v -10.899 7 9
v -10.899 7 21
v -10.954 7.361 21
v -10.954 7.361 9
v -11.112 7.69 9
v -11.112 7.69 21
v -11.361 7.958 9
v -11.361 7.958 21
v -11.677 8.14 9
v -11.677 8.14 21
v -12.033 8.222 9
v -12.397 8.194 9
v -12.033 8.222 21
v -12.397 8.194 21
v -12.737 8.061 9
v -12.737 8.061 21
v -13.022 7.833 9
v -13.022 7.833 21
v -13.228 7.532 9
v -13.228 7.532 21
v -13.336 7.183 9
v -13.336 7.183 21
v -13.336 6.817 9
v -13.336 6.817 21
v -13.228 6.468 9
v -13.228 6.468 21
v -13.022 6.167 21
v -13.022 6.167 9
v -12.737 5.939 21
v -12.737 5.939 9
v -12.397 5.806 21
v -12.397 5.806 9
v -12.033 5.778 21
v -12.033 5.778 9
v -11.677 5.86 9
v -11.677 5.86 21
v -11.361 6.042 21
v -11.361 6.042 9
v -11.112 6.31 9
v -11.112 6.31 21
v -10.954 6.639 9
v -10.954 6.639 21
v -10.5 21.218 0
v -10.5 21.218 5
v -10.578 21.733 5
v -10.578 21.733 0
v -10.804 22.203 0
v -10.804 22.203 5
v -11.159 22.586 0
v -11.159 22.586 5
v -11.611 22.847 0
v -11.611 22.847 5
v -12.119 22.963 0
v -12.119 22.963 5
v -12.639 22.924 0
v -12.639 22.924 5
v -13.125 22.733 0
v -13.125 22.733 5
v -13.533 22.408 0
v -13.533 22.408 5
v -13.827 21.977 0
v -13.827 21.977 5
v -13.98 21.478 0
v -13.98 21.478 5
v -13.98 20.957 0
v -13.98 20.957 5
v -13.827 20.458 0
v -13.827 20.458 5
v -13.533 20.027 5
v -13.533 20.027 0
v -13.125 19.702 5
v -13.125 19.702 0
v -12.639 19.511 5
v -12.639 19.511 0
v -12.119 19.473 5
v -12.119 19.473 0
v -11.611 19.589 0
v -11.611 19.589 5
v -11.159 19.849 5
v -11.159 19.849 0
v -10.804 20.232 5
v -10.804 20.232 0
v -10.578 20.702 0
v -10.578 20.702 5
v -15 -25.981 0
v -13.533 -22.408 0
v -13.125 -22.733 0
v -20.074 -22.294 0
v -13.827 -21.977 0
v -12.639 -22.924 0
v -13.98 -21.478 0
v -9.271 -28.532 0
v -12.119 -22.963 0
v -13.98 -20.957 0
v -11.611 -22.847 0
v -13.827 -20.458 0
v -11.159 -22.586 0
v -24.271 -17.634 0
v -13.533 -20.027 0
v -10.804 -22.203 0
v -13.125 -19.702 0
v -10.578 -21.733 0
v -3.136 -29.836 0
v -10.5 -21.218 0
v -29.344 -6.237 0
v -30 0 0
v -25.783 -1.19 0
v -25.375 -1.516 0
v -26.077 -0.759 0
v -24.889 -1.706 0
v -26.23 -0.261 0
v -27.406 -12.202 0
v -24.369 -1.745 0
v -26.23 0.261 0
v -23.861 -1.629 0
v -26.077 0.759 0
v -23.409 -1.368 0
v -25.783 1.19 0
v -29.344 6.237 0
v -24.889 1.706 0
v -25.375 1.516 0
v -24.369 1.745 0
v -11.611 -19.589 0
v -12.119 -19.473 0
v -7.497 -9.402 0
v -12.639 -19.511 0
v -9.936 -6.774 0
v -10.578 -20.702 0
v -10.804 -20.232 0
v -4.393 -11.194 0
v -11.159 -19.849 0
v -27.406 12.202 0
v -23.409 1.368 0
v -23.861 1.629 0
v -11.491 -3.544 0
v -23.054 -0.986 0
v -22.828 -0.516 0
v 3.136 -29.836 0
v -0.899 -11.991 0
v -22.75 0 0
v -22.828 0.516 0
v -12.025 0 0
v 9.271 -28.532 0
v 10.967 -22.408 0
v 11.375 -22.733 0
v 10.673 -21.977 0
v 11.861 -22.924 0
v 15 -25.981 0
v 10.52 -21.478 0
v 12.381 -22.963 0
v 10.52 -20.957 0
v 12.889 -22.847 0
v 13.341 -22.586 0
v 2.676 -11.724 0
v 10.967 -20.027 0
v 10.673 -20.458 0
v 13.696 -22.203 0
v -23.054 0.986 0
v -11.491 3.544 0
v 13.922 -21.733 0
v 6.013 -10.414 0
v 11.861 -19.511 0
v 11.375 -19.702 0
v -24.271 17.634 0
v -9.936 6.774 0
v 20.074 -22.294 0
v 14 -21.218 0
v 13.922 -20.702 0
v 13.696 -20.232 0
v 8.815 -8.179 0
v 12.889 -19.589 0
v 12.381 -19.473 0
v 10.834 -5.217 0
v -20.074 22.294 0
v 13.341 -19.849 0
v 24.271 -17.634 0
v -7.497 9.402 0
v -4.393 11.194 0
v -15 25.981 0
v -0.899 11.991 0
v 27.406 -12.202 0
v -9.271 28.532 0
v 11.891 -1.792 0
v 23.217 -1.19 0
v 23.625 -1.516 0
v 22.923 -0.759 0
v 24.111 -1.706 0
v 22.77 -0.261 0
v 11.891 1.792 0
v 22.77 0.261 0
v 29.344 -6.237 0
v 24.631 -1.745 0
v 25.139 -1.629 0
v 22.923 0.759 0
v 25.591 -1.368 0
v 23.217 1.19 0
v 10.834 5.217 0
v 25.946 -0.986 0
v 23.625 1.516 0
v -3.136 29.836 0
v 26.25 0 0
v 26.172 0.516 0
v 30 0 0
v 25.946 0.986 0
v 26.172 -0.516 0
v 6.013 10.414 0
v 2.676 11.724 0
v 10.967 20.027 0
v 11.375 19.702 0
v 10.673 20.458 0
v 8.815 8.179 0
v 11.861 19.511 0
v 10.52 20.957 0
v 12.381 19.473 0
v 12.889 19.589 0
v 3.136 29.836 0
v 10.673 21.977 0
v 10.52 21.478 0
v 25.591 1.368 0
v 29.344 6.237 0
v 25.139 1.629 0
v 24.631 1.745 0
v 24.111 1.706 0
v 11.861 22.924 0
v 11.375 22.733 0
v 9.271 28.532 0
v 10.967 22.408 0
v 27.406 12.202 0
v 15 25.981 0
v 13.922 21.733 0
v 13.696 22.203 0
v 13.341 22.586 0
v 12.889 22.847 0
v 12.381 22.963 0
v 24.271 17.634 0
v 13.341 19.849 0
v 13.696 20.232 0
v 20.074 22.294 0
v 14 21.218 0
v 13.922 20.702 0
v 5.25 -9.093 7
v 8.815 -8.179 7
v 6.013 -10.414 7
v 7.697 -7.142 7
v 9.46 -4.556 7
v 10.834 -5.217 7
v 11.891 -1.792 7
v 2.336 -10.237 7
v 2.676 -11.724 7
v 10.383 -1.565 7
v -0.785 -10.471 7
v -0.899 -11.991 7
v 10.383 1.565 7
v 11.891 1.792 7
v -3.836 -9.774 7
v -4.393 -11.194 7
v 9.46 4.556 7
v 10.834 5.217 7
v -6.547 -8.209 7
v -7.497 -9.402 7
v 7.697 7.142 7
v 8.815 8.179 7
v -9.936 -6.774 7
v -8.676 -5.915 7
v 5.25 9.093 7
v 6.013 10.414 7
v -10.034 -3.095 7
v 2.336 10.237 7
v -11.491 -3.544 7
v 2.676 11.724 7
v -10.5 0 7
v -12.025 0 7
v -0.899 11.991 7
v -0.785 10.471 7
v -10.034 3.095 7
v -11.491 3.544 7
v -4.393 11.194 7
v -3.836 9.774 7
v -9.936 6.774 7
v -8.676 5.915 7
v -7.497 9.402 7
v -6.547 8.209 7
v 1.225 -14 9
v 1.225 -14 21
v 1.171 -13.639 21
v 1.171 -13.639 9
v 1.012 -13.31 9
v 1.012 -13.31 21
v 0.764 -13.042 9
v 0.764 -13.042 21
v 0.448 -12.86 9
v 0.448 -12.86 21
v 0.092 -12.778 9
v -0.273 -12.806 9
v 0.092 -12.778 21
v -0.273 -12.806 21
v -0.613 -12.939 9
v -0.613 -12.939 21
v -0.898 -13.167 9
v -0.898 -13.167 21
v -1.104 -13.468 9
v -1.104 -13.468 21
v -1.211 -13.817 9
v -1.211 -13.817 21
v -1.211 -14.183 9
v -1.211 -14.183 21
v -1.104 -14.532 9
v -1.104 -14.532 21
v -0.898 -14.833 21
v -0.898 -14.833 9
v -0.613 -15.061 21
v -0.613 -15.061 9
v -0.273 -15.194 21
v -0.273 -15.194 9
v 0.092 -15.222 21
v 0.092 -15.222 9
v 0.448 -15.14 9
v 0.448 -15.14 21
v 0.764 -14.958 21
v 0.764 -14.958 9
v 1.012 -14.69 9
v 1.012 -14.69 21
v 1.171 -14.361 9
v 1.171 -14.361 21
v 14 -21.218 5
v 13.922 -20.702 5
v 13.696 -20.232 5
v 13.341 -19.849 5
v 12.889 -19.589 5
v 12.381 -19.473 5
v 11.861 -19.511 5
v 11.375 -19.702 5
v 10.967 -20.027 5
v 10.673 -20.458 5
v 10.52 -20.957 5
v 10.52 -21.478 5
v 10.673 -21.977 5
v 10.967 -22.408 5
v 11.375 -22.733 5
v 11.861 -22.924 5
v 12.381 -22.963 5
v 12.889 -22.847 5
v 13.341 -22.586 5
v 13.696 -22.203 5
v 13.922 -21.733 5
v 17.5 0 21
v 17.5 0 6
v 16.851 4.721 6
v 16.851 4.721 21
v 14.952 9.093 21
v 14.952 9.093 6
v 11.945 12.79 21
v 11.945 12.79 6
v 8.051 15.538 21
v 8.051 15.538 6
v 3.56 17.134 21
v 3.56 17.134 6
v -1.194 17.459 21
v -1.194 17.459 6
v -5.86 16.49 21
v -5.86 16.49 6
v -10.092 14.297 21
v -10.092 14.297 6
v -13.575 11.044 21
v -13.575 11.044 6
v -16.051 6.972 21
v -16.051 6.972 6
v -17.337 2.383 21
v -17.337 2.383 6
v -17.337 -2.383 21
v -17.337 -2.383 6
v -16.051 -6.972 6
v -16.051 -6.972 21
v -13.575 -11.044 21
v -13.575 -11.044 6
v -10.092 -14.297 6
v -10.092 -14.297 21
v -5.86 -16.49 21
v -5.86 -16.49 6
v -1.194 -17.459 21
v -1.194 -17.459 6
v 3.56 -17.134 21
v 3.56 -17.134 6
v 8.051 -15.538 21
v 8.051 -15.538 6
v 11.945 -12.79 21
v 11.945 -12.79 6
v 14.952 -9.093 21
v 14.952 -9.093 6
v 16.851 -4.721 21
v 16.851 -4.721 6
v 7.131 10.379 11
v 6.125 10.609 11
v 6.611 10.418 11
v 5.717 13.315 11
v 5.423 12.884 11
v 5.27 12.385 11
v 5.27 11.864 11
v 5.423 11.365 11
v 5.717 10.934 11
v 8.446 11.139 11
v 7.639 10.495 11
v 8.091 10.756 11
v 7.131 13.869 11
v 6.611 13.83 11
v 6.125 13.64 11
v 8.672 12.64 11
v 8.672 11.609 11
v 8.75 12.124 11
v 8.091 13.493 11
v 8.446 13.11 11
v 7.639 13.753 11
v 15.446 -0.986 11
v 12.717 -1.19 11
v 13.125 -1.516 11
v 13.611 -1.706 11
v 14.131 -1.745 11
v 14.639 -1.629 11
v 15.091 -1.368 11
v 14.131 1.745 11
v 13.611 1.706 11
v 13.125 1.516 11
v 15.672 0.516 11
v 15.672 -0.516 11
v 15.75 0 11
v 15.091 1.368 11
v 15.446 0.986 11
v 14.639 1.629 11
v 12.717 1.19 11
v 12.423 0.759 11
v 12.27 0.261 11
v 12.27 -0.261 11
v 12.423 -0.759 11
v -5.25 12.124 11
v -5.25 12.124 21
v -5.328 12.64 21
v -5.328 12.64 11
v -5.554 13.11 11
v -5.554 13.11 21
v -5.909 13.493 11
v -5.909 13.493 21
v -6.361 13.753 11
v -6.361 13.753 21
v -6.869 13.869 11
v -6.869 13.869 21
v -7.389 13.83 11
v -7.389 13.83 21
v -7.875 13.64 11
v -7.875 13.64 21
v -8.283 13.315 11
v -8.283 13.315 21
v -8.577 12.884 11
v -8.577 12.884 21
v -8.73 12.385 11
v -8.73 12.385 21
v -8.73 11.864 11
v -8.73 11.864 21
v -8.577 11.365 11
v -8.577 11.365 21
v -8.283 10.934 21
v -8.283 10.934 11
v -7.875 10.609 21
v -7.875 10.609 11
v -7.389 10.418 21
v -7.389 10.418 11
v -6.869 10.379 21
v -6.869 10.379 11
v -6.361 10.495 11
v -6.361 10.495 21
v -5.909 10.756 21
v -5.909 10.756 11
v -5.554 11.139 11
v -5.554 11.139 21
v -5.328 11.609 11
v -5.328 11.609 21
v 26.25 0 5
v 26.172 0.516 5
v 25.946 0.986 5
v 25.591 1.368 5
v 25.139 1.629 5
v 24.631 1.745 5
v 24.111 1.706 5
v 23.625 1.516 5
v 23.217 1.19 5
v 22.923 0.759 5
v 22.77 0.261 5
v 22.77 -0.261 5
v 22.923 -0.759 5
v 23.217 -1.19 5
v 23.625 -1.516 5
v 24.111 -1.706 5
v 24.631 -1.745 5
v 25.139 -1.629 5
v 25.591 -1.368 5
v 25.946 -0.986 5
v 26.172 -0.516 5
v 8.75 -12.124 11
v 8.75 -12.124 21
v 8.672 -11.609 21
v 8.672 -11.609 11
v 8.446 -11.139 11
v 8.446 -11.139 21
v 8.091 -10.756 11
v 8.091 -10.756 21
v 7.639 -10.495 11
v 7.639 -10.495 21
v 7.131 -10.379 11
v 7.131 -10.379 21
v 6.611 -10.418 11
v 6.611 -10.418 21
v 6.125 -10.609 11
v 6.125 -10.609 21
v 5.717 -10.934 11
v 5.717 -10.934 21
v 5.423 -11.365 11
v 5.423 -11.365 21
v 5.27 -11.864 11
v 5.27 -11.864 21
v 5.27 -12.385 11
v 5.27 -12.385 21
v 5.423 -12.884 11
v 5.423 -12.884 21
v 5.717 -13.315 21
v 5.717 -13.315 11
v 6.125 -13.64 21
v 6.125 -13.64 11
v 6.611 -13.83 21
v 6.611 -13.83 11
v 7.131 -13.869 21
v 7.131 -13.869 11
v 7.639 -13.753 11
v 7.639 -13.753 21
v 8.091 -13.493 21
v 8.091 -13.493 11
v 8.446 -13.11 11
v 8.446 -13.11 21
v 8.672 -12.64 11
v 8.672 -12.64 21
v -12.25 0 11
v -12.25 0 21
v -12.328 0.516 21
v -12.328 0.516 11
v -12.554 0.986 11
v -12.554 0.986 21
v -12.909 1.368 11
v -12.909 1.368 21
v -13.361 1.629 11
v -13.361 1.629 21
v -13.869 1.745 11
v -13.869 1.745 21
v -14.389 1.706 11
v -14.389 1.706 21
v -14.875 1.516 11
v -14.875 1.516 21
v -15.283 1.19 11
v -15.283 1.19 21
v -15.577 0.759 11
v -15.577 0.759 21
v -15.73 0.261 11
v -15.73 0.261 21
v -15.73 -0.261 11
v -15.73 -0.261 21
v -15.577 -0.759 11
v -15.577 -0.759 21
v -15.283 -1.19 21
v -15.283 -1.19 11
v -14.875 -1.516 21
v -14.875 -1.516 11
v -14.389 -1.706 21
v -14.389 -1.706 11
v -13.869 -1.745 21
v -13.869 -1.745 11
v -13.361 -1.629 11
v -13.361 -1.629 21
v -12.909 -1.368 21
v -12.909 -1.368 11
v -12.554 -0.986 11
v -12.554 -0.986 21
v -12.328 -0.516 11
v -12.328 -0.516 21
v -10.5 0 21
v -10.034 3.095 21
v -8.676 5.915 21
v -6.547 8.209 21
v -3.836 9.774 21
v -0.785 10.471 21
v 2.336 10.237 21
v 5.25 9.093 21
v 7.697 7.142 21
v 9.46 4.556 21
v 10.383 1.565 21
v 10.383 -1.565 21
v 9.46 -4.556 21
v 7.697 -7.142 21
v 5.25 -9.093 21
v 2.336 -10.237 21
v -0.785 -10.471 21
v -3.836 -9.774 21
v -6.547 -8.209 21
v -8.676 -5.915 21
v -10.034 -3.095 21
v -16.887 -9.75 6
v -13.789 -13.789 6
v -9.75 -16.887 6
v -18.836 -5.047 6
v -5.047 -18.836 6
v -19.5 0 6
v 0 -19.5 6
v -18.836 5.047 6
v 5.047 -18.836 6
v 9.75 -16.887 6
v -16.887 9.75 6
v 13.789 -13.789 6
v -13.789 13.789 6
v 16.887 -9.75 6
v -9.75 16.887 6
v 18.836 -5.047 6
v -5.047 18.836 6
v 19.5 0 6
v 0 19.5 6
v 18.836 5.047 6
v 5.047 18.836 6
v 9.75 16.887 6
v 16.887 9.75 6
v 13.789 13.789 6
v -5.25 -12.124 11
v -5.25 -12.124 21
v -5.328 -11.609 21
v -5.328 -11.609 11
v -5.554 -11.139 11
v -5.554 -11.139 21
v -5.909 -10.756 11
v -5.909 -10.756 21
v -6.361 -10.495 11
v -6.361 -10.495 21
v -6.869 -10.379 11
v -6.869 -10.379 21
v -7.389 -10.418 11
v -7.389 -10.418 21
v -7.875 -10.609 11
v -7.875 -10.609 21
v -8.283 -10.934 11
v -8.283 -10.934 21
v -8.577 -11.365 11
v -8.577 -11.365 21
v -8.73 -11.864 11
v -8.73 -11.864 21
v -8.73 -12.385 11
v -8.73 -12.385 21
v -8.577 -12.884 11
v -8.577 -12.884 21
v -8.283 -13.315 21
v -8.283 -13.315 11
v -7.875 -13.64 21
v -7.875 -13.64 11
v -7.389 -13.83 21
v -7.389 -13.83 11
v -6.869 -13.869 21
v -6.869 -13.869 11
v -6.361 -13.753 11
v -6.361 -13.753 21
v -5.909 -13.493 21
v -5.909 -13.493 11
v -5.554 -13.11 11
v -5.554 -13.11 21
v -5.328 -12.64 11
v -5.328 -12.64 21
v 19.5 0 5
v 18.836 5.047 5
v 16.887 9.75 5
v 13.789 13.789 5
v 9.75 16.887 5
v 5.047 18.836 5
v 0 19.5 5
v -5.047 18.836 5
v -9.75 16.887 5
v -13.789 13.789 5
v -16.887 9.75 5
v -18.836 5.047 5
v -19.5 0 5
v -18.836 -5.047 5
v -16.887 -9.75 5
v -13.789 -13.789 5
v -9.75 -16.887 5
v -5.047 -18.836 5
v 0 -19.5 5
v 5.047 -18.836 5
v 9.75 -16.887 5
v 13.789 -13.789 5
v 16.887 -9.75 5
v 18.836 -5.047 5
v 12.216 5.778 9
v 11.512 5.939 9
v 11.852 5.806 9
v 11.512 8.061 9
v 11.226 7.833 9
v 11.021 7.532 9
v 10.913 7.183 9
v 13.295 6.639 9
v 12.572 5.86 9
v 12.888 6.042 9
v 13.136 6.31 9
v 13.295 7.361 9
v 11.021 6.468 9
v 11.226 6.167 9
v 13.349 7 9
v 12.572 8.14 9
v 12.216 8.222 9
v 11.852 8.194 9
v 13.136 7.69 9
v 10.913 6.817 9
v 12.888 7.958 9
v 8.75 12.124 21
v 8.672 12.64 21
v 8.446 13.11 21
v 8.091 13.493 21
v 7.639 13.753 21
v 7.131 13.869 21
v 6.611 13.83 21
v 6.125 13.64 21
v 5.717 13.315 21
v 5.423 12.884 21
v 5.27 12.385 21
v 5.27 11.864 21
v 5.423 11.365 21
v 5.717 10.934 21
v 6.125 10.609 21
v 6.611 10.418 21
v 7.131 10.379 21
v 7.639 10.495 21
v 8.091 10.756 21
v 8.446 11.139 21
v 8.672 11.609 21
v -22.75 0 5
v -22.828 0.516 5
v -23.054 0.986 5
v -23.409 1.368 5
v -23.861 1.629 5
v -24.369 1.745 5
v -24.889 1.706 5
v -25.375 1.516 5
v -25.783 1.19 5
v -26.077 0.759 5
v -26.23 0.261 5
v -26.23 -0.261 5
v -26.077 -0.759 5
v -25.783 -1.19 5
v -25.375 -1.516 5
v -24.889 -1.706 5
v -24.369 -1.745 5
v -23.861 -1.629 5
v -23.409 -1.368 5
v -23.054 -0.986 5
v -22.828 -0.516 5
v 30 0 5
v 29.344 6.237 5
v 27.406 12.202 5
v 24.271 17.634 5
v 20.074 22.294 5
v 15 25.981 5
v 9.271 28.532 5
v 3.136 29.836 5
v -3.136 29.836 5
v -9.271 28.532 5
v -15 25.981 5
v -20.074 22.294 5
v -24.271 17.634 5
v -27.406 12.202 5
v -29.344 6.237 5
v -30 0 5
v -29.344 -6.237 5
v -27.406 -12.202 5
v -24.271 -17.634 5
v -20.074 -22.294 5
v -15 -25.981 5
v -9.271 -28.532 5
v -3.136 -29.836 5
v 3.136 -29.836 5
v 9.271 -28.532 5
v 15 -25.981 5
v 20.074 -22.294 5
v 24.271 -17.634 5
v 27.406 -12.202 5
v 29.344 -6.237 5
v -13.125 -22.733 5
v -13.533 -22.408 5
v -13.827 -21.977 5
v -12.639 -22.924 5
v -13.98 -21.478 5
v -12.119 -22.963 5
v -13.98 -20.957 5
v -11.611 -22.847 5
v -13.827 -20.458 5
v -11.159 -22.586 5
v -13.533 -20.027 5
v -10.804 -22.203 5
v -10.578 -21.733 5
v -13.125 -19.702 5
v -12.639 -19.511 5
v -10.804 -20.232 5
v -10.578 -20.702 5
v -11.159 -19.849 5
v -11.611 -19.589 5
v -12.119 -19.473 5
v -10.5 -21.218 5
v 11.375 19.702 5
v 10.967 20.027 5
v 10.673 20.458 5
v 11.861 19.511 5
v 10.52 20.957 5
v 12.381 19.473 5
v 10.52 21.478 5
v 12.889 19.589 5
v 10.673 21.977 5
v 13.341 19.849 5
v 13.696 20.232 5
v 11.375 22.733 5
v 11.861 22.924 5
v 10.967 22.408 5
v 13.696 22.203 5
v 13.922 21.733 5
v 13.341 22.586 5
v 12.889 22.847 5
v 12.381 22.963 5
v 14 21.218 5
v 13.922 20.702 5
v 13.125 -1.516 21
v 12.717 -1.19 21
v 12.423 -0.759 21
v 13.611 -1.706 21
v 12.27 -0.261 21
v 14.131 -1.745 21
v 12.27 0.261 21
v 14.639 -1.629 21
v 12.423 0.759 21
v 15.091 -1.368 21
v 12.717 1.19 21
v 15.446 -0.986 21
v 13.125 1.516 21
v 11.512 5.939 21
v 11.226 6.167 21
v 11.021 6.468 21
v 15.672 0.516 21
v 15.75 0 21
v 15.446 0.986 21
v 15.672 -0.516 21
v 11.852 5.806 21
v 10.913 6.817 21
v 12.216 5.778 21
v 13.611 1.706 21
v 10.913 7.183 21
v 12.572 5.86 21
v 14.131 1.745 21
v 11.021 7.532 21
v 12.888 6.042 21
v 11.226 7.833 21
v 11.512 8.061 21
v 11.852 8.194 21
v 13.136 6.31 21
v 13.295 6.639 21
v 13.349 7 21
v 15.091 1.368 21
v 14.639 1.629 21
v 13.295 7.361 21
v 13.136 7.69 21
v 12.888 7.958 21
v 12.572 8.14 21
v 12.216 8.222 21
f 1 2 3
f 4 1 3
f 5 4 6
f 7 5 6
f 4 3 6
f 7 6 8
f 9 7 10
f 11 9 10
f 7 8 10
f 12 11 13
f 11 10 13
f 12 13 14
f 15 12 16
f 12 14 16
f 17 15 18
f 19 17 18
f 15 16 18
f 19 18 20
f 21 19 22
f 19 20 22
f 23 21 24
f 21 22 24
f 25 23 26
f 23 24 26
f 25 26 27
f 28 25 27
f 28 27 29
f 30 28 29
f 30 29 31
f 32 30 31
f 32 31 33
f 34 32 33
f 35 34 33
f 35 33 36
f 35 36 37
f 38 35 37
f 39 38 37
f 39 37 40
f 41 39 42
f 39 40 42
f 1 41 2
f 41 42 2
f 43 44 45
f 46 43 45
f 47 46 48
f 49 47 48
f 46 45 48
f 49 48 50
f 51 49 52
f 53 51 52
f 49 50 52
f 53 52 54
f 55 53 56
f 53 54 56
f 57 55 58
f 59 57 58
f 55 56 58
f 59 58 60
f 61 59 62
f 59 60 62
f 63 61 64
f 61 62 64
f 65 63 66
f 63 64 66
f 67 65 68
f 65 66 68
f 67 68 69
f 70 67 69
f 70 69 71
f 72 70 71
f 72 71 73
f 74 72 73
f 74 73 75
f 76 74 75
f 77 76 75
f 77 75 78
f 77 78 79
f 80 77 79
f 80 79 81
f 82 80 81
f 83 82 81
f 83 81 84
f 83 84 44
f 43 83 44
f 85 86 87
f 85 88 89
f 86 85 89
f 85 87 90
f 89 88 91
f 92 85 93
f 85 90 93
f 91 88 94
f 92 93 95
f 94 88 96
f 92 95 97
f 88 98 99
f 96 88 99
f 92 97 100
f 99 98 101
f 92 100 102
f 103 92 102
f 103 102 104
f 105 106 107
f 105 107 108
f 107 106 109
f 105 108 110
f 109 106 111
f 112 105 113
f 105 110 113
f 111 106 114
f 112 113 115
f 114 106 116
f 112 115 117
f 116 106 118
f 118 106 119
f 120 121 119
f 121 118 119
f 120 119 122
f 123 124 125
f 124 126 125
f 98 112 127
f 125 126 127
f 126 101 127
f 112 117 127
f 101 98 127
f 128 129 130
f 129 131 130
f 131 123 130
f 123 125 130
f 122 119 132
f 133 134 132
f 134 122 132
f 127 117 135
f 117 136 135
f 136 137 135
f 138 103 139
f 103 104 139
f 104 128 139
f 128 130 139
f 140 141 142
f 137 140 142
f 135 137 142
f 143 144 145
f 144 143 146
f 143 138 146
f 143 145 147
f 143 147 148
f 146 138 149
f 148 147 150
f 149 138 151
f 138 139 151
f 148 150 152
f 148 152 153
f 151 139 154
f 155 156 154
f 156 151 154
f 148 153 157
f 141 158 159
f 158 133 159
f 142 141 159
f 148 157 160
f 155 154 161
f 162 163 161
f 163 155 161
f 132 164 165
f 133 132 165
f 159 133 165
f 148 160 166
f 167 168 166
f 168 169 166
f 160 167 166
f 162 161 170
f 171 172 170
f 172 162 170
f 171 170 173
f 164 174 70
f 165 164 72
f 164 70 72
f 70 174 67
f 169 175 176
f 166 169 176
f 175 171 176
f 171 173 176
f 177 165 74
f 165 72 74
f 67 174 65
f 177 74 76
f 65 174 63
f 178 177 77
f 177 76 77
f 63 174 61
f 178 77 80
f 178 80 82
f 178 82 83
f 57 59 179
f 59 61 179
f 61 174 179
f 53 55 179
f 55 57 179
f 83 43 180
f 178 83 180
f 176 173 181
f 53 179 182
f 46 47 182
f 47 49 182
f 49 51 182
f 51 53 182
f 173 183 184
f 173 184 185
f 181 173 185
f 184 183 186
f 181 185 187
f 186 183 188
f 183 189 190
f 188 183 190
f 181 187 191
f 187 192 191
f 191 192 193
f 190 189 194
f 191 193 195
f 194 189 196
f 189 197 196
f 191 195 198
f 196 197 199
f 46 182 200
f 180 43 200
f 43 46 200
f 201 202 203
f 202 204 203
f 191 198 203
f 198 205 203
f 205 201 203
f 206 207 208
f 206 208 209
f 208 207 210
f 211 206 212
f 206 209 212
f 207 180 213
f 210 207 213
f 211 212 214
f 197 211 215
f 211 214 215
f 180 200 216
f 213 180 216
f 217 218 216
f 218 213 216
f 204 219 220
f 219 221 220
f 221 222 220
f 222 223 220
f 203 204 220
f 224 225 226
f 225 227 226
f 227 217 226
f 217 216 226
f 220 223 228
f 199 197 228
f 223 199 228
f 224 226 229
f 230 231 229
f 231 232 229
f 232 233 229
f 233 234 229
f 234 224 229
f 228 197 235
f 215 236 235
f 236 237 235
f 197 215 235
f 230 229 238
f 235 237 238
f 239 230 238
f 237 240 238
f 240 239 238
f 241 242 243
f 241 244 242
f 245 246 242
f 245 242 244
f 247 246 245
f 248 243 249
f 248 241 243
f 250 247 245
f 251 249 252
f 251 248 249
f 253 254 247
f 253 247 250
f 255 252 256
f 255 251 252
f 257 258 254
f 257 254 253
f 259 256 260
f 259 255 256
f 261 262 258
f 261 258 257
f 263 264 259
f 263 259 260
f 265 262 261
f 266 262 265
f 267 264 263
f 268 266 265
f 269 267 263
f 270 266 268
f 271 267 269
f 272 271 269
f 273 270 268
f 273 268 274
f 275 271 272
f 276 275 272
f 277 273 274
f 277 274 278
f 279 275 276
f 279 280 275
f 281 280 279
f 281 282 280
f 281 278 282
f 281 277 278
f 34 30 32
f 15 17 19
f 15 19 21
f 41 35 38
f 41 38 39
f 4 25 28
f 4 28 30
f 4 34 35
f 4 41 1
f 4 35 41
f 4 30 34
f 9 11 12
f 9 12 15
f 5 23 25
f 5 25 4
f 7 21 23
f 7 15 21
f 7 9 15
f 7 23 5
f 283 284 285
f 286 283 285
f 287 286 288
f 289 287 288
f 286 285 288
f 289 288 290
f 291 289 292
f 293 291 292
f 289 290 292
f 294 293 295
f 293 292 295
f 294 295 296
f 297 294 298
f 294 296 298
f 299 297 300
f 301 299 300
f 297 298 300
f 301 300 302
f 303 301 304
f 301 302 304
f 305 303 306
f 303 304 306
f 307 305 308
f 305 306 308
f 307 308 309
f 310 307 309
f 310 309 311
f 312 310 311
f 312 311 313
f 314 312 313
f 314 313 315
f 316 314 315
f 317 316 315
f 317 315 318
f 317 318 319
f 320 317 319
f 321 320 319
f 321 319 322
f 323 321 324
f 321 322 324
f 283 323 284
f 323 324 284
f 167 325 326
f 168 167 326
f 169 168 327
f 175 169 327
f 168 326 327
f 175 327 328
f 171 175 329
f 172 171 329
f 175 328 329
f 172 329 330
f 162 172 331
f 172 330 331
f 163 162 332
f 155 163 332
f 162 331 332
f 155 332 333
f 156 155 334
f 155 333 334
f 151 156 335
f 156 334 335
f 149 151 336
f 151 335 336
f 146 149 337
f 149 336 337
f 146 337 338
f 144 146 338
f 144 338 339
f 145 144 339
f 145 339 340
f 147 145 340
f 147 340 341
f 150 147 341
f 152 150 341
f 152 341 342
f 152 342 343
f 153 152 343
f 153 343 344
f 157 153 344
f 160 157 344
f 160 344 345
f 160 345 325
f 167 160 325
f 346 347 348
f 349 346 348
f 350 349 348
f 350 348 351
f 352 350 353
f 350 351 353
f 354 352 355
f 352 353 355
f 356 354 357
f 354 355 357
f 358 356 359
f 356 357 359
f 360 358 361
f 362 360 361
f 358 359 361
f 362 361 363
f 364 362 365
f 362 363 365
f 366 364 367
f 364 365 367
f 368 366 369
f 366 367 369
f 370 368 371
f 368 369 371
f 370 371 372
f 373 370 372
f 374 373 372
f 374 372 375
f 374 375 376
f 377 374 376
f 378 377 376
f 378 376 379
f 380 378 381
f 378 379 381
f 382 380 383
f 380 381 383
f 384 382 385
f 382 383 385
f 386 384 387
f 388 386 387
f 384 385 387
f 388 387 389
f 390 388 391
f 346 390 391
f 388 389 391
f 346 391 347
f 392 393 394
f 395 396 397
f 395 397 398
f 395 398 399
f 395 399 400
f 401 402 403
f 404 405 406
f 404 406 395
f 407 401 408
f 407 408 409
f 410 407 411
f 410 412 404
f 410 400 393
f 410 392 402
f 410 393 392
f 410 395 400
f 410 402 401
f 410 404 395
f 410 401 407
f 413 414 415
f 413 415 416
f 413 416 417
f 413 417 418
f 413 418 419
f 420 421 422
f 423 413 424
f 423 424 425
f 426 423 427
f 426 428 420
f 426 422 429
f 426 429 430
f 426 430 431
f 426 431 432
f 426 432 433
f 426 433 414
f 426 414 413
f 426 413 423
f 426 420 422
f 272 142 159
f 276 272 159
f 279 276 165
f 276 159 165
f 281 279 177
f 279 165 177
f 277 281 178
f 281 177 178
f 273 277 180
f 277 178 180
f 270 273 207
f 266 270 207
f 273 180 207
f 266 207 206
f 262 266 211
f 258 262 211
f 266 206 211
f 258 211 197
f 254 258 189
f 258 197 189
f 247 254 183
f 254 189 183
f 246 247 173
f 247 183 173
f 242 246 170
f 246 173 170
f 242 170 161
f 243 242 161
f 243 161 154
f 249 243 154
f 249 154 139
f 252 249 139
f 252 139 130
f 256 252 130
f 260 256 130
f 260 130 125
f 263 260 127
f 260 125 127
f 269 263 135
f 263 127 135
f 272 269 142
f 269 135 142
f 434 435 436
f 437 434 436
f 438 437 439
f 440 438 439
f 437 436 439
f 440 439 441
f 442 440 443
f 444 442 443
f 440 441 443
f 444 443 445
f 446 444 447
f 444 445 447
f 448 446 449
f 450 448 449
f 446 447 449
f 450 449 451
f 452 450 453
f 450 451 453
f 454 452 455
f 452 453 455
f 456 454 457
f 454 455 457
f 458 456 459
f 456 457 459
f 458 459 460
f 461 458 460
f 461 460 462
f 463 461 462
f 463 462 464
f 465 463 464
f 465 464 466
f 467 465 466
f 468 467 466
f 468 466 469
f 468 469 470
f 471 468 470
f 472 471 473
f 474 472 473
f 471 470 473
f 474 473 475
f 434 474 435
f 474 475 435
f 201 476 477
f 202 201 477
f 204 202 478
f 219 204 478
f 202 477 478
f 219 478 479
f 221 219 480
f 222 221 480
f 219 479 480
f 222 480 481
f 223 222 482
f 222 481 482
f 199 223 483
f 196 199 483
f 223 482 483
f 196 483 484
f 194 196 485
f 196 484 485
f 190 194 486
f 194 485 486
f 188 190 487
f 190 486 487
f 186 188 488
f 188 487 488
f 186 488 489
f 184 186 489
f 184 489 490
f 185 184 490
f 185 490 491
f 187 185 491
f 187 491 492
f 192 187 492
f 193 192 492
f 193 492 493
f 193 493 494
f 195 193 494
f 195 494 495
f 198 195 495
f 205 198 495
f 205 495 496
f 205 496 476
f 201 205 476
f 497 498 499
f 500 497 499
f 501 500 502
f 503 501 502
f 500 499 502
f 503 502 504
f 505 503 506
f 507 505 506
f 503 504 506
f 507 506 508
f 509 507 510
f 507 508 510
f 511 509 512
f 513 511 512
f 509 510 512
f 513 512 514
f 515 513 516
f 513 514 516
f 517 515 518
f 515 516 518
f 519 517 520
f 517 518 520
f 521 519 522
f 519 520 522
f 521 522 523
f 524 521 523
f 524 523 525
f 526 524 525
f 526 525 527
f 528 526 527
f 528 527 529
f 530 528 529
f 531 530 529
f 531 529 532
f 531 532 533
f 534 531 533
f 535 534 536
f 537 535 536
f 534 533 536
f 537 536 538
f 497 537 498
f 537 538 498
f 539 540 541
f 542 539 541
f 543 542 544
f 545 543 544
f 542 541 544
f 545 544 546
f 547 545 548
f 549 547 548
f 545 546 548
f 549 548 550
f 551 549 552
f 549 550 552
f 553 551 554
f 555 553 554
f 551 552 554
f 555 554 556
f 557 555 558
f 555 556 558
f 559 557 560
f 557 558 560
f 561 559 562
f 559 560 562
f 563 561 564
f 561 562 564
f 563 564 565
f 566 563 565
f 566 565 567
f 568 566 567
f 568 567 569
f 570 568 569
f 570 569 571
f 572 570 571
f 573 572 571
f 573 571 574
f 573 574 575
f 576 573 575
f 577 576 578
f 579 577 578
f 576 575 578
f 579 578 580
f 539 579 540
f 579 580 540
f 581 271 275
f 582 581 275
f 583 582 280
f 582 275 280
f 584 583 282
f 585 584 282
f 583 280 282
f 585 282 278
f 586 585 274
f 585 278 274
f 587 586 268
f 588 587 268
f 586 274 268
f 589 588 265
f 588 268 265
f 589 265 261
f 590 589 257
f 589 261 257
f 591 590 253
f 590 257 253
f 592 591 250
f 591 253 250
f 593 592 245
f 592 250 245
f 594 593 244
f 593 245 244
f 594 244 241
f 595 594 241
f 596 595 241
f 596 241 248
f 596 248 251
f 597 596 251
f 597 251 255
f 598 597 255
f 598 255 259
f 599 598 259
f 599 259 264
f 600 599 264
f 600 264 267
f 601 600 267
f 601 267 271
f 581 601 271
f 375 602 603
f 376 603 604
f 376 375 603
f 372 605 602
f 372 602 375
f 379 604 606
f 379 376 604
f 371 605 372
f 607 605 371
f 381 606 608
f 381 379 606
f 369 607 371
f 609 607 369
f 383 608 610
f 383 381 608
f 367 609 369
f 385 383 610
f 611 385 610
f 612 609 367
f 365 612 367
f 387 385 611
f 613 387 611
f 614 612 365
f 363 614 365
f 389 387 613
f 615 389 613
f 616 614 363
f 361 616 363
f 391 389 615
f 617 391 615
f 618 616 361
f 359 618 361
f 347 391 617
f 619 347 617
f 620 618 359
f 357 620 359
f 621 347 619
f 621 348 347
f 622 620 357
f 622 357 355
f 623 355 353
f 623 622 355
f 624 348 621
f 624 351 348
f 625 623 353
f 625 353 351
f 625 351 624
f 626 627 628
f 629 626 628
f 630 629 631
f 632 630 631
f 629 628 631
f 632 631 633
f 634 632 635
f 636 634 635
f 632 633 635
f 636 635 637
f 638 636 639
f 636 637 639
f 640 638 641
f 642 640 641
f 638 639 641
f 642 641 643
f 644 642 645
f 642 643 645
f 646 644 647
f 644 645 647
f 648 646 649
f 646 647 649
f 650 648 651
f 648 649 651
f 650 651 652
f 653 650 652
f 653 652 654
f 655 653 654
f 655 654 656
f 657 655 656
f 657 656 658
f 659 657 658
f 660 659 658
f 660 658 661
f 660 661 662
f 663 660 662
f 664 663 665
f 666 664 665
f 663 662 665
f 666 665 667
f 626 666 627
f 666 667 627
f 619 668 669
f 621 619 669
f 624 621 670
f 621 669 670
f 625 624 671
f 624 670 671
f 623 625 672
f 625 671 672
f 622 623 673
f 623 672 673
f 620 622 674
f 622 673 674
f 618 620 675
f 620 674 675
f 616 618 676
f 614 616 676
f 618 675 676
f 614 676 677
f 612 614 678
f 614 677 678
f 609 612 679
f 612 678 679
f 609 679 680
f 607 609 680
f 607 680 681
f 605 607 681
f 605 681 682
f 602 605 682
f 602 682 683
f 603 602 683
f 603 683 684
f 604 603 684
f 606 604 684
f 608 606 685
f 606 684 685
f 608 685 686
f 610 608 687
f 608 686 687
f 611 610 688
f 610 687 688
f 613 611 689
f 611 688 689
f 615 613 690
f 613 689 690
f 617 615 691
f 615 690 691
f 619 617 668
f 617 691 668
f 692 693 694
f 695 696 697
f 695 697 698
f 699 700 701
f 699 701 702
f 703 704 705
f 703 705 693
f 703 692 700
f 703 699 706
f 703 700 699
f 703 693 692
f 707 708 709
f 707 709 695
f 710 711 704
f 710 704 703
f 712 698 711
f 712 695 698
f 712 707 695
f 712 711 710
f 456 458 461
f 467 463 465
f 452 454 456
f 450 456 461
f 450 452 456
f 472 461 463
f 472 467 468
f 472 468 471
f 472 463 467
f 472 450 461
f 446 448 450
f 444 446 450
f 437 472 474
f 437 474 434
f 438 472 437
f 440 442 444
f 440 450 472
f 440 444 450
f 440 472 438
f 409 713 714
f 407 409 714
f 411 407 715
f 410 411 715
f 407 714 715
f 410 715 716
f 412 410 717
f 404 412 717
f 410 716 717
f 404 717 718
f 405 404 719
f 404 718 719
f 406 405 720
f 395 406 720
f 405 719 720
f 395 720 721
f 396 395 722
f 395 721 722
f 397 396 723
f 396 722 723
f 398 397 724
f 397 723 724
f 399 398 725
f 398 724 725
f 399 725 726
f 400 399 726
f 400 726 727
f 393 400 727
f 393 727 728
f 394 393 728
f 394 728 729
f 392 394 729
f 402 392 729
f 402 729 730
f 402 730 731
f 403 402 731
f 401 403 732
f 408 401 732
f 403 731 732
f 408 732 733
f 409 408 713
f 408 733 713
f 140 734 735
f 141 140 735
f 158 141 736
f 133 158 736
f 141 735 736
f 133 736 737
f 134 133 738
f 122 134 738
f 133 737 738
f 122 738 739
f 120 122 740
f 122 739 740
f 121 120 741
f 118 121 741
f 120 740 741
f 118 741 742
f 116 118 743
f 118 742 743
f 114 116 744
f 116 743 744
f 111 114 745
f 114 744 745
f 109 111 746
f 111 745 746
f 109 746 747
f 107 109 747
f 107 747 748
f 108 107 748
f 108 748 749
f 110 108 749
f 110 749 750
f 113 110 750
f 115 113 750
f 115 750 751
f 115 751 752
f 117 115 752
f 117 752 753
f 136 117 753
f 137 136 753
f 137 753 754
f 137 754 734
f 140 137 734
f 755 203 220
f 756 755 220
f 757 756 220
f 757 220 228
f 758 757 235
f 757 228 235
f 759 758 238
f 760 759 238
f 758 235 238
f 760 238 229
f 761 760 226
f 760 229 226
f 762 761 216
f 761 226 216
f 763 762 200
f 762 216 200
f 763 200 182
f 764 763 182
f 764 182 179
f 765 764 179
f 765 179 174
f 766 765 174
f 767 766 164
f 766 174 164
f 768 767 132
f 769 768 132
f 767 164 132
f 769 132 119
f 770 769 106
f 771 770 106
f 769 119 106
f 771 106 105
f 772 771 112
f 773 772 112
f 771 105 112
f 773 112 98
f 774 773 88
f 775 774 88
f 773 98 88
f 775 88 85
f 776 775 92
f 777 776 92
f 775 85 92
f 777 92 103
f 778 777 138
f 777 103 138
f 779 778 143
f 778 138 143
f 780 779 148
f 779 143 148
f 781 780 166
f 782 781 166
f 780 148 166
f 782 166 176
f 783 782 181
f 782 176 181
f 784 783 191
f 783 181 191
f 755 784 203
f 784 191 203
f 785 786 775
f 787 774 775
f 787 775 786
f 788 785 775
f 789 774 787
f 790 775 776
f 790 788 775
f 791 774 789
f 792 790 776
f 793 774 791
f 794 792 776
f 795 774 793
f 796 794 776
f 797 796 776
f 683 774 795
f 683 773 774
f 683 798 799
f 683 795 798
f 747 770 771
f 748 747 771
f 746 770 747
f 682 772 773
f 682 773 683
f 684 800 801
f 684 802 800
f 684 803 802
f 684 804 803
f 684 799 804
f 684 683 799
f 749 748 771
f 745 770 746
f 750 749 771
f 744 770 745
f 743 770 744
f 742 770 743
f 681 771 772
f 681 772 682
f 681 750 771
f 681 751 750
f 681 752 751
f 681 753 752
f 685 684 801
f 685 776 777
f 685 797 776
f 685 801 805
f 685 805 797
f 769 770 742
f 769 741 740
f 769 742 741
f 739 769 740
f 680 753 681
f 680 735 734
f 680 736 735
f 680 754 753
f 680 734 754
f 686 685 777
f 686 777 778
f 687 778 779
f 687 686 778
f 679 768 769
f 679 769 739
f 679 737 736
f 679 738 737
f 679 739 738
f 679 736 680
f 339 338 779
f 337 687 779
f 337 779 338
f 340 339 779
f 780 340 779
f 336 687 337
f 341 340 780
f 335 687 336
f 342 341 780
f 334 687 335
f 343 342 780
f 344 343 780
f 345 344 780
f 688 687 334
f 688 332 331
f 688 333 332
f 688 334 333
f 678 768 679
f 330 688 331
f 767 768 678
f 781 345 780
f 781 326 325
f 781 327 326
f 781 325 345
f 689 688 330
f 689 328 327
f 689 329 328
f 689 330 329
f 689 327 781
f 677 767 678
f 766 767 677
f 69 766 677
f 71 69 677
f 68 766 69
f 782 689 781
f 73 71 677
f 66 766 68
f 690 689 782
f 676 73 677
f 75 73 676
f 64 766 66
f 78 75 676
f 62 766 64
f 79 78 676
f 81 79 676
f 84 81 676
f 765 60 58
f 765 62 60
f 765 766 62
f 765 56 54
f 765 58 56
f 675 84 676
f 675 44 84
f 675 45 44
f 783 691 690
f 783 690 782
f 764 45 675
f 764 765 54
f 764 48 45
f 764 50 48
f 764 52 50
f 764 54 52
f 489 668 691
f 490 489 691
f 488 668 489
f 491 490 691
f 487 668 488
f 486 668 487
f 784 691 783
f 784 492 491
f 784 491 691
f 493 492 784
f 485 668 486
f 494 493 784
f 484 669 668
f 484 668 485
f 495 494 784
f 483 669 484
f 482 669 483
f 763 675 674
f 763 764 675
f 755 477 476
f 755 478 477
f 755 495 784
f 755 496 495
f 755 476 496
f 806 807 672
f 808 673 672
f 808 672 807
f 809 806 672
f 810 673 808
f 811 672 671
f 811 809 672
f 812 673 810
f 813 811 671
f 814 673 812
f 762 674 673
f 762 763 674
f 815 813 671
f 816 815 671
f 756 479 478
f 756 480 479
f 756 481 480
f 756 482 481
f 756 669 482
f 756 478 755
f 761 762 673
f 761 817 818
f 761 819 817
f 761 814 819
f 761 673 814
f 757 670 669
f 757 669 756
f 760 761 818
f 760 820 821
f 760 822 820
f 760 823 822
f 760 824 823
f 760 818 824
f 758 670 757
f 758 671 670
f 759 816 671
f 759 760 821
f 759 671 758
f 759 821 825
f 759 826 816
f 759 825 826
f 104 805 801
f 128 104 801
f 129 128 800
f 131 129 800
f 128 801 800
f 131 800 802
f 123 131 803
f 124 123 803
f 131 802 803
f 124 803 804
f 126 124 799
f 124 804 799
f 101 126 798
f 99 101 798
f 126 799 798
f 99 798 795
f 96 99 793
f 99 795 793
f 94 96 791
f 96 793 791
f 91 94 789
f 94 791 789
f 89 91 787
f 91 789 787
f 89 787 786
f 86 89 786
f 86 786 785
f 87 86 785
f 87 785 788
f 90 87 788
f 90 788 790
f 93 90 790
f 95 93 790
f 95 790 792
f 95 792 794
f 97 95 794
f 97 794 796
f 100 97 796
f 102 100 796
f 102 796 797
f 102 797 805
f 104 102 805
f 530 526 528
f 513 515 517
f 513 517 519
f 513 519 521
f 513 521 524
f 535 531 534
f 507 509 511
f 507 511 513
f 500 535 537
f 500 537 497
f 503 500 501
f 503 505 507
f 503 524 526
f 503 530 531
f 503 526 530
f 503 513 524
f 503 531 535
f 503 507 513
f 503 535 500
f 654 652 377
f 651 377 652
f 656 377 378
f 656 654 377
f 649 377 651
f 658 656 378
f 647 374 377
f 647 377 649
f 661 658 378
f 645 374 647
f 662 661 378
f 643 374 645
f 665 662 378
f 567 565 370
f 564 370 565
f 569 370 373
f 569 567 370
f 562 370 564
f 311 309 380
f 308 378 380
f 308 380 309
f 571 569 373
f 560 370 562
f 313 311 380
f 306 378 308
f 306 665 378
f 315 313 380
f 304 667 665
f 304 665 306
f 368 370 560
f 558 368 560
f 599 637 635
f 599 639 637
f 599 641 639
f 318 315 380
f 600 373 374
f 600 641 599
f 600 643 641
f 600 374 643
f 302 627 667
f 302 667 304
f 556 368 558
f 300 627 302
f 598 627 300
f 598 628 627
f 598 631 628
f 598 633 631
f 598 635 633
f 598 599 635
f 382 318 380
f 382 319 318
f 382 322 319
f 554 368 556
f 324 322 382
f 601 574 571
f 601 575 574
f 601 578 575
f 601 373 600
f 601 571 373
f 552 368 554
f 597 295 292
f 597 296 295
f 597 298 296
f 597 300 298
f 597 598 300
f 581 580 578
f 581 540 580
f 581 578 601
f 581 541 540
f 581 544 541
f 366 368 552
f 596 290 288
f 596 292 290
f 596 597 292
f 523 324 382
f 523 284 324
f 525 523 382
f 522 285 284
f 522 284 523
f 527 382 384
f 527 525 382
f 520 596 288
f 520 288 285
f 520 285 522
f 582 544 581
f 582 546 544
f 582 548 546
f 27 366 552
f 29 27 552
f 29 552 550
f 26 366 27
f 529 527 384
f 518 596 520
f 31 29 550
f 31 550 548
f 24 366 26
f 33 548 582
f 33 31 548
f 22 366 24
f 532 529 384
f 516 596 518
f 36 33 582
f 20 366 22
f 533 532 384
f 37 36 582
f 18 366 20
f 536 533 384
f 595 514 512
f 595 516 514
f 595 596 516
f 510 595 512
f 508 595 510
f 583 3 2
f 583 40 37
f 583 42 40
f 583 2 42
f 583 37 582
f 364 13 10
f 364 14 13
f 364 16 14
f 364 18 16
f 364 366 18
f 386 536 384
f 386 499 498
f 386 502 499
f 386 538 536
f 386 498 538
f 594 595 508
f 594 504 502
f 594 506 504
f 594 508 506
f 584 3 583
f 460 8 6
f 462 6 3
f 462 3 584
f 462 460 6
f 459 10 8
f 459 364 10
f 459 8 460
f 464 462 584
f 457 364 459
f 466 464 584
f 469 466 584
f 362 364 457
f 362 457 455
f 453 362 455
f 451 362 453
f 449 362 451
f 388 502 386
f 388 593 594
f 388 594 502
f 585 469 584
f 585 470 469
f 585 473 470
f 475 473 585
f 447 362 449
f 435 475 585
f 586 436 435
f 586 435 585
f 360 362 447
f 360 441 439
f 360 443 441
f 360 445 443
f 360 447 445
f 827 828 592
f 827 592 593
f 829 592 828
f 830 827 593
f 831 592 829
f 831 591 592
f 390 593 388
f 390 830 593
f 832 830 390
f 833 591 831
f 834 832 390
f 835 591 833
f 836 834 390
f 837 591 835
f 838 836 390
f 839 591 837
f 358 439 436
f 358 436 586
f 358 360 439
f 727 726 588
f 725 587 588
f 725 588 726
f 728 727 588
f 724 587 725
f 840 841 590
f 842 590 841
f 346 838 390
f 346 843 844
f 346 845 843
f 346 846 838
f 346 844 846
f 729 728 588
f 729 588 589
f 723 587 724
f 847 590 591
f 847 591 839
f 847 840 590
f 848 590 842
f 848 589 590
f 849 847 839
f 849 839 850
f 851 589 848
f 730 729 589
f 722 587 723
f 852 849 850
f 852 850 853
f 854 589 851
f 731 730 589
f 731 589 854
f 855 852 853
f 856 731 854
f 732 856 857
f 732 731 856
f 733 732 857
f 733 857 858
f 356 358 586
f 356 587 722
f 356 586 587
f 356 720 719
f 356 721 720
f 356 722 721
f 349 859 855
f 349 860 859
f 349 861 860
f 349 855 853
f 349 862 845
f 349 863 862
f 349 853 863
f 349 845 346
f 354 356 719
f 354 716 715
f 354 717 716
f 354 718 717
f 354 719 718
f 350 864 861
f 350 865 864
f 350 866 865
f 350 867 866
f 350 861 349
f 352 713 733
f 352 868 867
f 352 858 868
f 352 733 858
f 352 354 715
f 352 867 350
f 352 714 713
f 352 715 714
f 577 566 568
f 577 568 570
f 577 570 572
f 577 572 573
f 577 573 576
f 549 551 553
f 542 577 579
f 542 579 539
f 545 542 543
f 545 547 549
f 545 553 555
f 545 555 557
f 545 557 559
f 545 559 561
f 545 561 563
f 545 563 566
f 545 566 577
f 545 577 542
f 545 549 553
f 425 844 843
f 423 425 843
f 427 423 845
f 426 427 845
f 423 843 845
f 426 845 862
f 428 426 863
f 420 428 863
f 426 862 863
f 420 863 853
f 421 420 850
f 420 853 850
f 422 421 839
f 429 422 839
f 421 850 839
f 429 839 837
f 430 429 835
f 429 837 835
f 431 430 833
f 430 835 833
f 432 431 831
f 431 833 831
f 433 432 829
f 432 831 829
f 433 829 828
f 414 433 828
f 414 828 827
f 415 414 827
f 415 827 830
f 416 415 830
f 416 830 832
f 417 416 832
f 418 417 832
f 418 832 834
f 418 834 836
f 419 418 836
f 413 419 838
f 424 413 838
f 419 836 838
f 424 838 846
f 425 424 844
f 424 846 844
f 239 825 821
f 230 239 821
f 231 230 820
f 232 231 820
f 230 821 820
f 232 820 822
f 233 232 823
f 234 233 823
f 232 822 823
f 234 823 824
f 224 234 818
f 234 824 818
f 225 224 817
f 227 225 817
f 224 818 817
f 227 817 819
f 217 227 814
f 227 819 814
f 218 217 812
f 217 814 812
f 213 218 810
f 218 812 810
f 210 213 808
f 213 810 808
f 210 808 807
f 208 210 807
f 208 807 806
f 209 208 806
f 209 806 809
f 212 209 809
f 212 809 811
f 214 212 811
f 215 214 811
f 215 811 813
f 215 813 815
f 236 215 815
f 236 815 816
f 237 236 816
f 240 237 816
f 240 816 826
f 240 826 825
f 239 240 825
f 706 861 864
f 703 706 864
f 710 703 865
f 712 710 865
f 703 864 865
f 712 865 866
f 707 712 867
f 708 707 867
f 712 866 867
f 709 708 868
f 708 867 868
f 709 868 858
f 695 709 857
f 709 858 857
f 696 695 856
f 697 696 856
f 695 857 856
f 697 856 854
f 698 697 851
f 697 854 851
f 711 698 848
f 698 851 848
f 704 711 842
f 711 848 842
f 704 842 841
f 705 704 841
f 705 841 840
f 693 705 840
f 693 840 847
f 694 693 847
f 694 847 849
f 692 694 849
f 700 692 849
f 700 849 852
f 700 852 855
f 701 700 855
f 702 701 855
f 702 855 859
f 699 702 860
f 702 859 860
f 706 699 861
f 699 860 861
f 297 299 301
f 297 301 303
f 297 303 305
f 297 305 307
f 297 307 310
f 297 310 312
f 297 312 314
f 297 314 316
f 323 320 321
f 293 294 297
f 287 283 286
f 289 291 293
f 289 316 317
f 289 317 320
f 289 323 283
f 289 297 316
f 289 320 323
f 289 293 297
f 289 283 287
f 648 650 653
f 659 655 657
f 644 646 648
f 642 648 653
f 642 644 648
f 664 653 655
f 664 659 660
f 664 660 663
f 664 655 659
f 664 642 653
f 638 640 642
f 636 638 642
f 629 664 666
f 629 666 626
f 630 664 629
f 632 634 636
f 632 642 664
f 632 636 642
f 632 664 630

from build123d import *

# Parameters (mm, degrees)
SKETCH1_R           = 30
BOSS_EXTRUDE1_DEPTH = 5
SKETCH2_R           = 19.5
BOSS_EXTRUDE2_DEPTH = 1
SKETCH3_R           = 17.5
BOSS_EXTRUDE3_DEPTH = 15
SKETCH4_R           = 12.025
CUT_EXTRUDE1_DEPTH  = 7
SKETCH5_R           = 10.5
CUT_EXTRUDE2_DEPTH  = 45.676615807
SKETCH6_R           = 1.75
CUT_EXTRUDE3_DEPTH  = 46.343136195
SKETCH7_R           = 1.75
CUT_EXTRUDE4_DEPTH  = 10
SKETCH8_R           = 1.225
CUT_EXTRUDE5_DEPTH  = 12


with BuildPart() as part:
    # Sketch1 → Boss-Extrude1 (new body)
    with BuildSketch(Plane.XY):
        Circle(SKETCH1_R)
    extrude(amount=BOSS_EXTRUDE1_DEPTH)

    # Sketch2 → Boss-Extrude2 (add)
    with BuildSketch(Plane.XY.offset(5)):
        Circle(SKETCH2_R)
    extrude(amount=BOSS_EXTRUDE2_DEPTH)

    # Sketch3 → Boss-Extrude3 (add)
    with BuildSketch(Plane.XY.offset(6)):
        Circle(SKETCH3_R)
    extrude(amount=BOSS_EXTRUDE3_DEPTH)

    # Sketch4 → Cut-Extrude1 (cut)
    with BuildSketch(Plane(origin=(0, 0, 0), x_dir=(-1, 0, 0), z_dir=(0, 0, -1))):
        Circle(SKETCH4_R)
    extrude(amount=-CUT_EXTRUDE1_DEPTH, mode=Mode.SUBTRACT)

    # Sketch5 → Cut-Extrude2 (cut, through all)
    with BuildSketch(Plane(origin=(0, 0, 7), x_dir=(-1, 0, 0), z_dir=(0, 0, -1))):
        Circle(SKETCH5_R)
    extrude(amount=-CUT_EXTRUDE2_DEPTH, mode=Mode.SUBTRACT)

    # Sketch6 → Cut-Extrude3 (cut, through all)
    with BuildSketch(Plane.XY.offset(5)):
        with Locations((24.5, 0)):
            Circle(SKETCH6_R)
        with Locations((12.25, -21.217622393)):
            Circle(SKETCH6_R)
        with Locations((-12.25, -21.217622393)):
            Circle(SKETCH6_R)
        with Locations((-24.5, 0)):
            Circle(SKETCH6_R)
        with Locations((-12.25, 21.217622393)):
            Circle(SKETCH6_R)
        with Locations((12.25, 21.217622393)):
            Circle(SKETCH6_R)
    extrude(amount=-CUT_EXTRUDE3_DEPTH, mode=Mode.SUBTRACT)

    # Sketch7 → Cut-Extrude4 (cut)
    with BuildSketch(Plane.XY.offset(21)):
        with Locations((14, 0)):
            Circle(SKETCH7_R)
        with Locations((7, -12.124355653)):
            Circle(SKETCH7_R)
        with Locations((-7, -12.124355653)):
            Circle(SKETCH7_R)
        with Locations((-14, 0)):
            Circle(SKETCH7_R)
        with Locations((-7, 12.124355653)):
            Circle(SKETCH7_R)
        with Locations((7, 12.124355653)):
            Circle(SKETCH7_R)
    extrude(amount=-CUT_EXTRUDE4_DEPTH, mode=Mode.SUBTRACT)

    # Sketch8 → Cut-Extrude5 (cut)
    with BuildSketch(Plane.XY.offset(21)):
        with Locations((12.124355653, 7)):
            Circle(SKETCH8_R)
        with Locations((0, -14)):
            Circle(SKETCH8_R)
        with Locations((-12.124355653, 7)):
            Circle(SKETCH8_R)
    extrude(amount=-CUT_EXTRUDE5_DEPTH, mode=Mode.SUBTRACT)


solid = part.part
